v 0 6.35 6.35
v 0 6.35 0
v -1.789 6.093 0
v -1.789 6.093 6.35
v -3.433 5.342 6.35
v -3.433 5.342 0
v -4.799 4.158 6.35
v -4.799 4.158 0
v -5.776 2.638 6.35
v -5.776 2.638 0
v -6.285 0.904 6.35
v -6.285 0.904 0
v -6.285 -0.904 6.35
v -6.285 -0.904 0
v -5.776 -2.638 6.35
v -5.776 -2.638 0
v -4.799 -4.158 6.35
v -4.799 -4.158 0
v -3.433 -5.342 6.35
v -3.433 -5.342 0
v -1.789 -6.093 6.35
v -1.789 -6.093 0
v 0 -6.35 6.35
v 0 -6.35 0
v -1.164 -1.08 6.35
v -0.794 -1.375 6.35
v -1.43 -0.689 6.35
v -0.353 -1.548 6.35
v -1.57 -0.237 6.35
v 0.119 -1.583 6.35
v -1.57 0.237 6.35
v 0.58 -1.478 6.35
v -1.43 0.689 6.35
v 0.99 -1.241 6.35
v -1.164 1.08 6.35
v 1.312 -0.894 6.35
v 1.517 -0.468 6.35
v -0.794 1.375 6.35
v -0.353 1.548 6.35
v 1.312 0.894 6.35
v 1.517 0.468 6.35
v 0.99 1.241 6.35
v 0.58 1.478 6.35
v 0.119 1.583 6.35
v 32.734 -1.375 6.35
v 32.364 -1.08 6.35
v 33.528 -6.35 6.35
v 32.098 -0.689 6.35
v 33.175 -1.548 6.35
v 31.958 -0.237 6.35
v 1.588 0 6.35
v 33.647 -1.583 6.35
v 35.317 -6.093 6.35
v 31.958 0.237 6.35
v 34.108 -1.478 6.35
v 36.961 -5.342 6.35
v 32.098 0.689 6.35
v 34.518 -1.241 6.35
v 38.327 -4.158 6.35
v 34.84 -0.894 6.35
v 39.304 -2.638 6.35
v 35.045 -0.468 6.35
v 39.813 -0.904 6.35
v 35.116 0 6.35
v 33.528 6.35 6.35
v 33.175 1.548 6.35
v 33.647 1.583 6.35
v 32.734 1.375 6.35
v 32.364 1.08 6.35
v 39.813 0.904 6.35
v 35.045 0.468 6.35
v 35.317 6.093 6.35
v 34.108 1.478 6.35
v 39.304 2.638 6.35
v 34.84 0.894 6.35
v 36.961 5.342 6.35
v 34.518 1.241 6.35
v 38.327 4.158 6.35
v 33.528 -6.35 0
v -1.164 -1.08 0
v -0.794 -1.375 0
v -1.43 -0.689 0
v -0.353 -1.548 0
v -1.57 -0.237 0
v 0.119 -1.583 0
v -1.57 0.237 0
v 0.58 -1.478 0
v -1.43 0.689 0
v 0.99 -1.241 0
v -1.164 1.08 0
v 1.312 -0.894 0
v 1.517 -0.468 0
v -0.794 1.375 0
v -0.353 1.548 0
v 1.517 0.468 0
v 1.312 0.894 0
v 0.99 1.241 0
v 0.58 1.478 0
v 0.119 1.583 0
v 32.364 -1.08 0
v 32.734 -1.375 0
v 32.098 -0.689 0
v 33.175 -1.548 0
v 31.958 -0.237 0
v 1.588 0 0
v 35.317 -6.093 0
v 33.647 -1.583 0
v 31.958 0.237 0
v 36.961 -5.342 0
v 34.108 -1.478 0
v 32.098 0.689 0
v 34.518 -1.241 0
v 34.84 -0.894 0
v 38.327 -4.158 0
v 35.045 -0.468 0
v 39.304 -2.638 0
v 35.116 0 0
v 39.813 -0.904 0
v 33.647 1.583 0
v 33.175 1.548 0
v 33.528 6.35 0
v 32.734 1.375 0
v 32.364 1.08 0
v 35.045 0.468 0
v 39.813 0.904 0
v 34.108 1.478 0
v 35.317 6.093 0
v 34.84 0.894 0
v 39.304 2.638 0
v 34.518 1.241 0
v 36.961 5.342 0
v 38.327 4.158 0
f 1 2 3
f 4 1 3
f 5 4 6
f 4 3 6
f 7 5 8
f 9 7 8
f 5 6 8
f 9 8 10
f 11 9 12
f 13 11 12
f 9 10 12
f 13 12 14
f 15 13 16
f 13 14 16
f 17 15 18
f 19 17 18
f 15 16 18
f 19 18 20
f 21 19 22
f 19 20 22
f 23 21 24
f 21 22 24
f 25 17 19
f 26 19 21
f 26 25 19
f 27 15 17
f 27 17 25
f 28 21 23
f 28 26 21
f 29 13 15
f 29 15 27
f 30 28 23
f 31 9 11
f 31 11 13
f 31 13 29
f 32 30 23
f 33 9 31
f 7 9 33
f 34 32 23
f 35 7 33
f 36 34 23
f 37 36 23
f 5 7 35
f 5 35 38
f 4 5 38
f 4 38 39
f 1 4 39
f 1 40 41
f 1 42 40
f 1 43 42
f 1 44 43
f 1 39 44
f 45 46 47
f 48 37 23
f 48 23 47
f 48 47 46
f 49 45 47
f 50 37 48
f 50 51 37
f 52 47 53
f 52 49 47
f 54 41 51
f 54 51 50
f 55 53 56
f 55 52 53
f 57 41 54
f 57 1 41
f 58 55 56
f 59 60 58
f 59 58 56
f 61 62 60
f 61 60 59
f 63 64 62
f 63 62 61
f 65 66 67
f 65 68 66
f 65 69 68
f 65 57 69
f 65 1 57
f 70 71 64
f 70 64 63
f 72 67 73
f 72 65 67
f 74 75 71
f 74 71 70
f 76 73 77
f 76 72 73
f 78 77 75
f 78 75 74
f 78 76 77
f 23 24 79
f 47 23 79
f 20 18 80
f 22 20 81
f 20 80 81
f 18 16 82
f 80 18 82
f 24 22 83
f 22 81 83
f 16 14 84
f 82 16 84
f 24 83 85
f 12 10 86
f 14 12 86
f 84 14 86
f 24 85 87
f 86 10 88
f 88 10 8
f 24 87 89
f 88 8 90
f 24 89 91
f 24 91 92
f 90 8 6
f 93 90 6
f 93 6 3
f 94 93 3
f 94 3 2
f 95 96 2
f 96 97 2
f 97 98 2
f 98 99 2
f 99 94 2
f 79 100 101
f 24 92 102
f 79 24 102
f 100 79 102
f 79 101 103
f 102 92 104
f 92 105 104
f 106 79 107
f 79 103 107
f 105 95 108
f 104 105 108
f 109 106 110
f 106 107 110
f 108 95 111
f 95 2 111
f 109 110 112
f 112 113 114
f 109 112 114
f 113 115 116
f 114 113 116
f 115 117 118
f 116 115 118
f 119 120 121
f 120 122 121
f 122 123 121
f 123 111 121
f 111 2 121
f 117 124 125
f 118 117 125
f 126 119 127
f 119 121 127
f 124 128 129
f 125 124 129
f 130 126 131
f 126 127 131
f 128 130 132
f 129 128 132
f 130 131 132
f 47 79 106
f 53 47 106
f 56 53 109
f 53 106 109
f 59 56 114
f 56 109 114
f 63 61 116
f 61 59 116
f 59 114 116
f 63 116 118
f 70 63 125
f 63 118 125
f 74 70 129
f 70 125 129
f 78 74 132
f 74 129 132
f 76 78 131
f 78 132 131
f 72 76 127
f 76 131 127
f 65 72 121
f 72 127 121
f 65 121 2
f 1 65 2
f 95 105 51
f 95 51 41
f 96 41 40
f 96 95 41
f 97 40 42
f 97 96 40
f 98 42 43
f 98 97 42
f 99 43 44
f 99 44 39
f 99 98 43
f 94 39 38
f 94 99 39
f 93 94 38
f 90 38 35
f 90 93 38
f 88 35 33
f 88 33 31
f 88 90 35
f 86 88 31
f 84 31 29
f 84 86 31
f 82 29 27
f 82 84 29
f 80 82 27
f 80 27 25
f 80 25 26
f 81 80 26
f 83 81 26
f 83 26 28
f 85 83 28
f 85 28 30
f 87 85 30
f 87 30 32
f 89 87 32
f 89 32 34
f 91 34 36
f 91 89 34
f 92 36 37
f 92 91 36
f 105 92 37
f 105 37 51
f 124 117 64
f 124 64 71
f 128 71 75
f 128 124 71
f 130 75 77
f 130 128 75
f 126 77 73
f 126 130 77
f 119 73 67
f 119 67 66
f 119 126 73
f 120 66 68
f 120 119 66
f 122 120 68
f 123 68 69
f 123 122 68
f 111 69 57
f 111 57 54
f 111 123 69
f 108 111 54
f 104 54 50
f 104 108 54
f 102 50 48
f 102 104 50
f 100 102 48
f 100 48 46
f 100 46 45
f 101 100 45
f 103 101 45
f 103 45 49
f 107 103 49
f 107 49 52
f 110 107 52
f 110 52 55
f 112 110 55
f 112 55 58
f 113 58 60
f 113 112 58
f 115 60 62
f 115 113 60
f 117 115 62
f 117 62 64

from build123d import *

# Parameters (mm, degrees)
SKETCH1_R           = 6.35
SKETCH1_R_2         = 1.5875
BOSS_EXTRUDE1_DEPTH = 6.35


with BuildPart() as part:
    # Sketch1 → Boss-Extrude1 (new body)
    # profile 1 of 3: a face of its own
    with BuildSketch(Plane.XY):
        with BuildLine():
            Line((33.528, 6.35), (0, 6.35))
            ThreePointArc((0, 6.35), (4.490128061, 4.490128061), (6.35, 0))
            ThreePointArc((6.35, 0), (4.490128061, -4.490128061), (0, -6.35))
            Line((0, -6.35), (33.528, -6.35))
            ThreePointArc((33.528, -6.35), (27.178, 0), (33.528, 6.35))
        make_face()
    # profile 2 of 3: a face of its own
    with BuildSketch(Plane.XY):
        Circle(SKETCH1_R)
        Circle(SKETCH1_R_2, mode=Mode.SUBTRACT)
    # profile 3 of 3: a face of its own
    with BuildSketch(Plane.XY):
        with Locations((33.528, 0)):
            Circle(SKETCH1_R)
        with Locations((33.528, 0)):
            Circle(SKETCH1_R_2, mode=Mode.SUBTRACT)
    extrude(amount=BOSS_EXTRUDE1_DEPTH)


solid = part.part
